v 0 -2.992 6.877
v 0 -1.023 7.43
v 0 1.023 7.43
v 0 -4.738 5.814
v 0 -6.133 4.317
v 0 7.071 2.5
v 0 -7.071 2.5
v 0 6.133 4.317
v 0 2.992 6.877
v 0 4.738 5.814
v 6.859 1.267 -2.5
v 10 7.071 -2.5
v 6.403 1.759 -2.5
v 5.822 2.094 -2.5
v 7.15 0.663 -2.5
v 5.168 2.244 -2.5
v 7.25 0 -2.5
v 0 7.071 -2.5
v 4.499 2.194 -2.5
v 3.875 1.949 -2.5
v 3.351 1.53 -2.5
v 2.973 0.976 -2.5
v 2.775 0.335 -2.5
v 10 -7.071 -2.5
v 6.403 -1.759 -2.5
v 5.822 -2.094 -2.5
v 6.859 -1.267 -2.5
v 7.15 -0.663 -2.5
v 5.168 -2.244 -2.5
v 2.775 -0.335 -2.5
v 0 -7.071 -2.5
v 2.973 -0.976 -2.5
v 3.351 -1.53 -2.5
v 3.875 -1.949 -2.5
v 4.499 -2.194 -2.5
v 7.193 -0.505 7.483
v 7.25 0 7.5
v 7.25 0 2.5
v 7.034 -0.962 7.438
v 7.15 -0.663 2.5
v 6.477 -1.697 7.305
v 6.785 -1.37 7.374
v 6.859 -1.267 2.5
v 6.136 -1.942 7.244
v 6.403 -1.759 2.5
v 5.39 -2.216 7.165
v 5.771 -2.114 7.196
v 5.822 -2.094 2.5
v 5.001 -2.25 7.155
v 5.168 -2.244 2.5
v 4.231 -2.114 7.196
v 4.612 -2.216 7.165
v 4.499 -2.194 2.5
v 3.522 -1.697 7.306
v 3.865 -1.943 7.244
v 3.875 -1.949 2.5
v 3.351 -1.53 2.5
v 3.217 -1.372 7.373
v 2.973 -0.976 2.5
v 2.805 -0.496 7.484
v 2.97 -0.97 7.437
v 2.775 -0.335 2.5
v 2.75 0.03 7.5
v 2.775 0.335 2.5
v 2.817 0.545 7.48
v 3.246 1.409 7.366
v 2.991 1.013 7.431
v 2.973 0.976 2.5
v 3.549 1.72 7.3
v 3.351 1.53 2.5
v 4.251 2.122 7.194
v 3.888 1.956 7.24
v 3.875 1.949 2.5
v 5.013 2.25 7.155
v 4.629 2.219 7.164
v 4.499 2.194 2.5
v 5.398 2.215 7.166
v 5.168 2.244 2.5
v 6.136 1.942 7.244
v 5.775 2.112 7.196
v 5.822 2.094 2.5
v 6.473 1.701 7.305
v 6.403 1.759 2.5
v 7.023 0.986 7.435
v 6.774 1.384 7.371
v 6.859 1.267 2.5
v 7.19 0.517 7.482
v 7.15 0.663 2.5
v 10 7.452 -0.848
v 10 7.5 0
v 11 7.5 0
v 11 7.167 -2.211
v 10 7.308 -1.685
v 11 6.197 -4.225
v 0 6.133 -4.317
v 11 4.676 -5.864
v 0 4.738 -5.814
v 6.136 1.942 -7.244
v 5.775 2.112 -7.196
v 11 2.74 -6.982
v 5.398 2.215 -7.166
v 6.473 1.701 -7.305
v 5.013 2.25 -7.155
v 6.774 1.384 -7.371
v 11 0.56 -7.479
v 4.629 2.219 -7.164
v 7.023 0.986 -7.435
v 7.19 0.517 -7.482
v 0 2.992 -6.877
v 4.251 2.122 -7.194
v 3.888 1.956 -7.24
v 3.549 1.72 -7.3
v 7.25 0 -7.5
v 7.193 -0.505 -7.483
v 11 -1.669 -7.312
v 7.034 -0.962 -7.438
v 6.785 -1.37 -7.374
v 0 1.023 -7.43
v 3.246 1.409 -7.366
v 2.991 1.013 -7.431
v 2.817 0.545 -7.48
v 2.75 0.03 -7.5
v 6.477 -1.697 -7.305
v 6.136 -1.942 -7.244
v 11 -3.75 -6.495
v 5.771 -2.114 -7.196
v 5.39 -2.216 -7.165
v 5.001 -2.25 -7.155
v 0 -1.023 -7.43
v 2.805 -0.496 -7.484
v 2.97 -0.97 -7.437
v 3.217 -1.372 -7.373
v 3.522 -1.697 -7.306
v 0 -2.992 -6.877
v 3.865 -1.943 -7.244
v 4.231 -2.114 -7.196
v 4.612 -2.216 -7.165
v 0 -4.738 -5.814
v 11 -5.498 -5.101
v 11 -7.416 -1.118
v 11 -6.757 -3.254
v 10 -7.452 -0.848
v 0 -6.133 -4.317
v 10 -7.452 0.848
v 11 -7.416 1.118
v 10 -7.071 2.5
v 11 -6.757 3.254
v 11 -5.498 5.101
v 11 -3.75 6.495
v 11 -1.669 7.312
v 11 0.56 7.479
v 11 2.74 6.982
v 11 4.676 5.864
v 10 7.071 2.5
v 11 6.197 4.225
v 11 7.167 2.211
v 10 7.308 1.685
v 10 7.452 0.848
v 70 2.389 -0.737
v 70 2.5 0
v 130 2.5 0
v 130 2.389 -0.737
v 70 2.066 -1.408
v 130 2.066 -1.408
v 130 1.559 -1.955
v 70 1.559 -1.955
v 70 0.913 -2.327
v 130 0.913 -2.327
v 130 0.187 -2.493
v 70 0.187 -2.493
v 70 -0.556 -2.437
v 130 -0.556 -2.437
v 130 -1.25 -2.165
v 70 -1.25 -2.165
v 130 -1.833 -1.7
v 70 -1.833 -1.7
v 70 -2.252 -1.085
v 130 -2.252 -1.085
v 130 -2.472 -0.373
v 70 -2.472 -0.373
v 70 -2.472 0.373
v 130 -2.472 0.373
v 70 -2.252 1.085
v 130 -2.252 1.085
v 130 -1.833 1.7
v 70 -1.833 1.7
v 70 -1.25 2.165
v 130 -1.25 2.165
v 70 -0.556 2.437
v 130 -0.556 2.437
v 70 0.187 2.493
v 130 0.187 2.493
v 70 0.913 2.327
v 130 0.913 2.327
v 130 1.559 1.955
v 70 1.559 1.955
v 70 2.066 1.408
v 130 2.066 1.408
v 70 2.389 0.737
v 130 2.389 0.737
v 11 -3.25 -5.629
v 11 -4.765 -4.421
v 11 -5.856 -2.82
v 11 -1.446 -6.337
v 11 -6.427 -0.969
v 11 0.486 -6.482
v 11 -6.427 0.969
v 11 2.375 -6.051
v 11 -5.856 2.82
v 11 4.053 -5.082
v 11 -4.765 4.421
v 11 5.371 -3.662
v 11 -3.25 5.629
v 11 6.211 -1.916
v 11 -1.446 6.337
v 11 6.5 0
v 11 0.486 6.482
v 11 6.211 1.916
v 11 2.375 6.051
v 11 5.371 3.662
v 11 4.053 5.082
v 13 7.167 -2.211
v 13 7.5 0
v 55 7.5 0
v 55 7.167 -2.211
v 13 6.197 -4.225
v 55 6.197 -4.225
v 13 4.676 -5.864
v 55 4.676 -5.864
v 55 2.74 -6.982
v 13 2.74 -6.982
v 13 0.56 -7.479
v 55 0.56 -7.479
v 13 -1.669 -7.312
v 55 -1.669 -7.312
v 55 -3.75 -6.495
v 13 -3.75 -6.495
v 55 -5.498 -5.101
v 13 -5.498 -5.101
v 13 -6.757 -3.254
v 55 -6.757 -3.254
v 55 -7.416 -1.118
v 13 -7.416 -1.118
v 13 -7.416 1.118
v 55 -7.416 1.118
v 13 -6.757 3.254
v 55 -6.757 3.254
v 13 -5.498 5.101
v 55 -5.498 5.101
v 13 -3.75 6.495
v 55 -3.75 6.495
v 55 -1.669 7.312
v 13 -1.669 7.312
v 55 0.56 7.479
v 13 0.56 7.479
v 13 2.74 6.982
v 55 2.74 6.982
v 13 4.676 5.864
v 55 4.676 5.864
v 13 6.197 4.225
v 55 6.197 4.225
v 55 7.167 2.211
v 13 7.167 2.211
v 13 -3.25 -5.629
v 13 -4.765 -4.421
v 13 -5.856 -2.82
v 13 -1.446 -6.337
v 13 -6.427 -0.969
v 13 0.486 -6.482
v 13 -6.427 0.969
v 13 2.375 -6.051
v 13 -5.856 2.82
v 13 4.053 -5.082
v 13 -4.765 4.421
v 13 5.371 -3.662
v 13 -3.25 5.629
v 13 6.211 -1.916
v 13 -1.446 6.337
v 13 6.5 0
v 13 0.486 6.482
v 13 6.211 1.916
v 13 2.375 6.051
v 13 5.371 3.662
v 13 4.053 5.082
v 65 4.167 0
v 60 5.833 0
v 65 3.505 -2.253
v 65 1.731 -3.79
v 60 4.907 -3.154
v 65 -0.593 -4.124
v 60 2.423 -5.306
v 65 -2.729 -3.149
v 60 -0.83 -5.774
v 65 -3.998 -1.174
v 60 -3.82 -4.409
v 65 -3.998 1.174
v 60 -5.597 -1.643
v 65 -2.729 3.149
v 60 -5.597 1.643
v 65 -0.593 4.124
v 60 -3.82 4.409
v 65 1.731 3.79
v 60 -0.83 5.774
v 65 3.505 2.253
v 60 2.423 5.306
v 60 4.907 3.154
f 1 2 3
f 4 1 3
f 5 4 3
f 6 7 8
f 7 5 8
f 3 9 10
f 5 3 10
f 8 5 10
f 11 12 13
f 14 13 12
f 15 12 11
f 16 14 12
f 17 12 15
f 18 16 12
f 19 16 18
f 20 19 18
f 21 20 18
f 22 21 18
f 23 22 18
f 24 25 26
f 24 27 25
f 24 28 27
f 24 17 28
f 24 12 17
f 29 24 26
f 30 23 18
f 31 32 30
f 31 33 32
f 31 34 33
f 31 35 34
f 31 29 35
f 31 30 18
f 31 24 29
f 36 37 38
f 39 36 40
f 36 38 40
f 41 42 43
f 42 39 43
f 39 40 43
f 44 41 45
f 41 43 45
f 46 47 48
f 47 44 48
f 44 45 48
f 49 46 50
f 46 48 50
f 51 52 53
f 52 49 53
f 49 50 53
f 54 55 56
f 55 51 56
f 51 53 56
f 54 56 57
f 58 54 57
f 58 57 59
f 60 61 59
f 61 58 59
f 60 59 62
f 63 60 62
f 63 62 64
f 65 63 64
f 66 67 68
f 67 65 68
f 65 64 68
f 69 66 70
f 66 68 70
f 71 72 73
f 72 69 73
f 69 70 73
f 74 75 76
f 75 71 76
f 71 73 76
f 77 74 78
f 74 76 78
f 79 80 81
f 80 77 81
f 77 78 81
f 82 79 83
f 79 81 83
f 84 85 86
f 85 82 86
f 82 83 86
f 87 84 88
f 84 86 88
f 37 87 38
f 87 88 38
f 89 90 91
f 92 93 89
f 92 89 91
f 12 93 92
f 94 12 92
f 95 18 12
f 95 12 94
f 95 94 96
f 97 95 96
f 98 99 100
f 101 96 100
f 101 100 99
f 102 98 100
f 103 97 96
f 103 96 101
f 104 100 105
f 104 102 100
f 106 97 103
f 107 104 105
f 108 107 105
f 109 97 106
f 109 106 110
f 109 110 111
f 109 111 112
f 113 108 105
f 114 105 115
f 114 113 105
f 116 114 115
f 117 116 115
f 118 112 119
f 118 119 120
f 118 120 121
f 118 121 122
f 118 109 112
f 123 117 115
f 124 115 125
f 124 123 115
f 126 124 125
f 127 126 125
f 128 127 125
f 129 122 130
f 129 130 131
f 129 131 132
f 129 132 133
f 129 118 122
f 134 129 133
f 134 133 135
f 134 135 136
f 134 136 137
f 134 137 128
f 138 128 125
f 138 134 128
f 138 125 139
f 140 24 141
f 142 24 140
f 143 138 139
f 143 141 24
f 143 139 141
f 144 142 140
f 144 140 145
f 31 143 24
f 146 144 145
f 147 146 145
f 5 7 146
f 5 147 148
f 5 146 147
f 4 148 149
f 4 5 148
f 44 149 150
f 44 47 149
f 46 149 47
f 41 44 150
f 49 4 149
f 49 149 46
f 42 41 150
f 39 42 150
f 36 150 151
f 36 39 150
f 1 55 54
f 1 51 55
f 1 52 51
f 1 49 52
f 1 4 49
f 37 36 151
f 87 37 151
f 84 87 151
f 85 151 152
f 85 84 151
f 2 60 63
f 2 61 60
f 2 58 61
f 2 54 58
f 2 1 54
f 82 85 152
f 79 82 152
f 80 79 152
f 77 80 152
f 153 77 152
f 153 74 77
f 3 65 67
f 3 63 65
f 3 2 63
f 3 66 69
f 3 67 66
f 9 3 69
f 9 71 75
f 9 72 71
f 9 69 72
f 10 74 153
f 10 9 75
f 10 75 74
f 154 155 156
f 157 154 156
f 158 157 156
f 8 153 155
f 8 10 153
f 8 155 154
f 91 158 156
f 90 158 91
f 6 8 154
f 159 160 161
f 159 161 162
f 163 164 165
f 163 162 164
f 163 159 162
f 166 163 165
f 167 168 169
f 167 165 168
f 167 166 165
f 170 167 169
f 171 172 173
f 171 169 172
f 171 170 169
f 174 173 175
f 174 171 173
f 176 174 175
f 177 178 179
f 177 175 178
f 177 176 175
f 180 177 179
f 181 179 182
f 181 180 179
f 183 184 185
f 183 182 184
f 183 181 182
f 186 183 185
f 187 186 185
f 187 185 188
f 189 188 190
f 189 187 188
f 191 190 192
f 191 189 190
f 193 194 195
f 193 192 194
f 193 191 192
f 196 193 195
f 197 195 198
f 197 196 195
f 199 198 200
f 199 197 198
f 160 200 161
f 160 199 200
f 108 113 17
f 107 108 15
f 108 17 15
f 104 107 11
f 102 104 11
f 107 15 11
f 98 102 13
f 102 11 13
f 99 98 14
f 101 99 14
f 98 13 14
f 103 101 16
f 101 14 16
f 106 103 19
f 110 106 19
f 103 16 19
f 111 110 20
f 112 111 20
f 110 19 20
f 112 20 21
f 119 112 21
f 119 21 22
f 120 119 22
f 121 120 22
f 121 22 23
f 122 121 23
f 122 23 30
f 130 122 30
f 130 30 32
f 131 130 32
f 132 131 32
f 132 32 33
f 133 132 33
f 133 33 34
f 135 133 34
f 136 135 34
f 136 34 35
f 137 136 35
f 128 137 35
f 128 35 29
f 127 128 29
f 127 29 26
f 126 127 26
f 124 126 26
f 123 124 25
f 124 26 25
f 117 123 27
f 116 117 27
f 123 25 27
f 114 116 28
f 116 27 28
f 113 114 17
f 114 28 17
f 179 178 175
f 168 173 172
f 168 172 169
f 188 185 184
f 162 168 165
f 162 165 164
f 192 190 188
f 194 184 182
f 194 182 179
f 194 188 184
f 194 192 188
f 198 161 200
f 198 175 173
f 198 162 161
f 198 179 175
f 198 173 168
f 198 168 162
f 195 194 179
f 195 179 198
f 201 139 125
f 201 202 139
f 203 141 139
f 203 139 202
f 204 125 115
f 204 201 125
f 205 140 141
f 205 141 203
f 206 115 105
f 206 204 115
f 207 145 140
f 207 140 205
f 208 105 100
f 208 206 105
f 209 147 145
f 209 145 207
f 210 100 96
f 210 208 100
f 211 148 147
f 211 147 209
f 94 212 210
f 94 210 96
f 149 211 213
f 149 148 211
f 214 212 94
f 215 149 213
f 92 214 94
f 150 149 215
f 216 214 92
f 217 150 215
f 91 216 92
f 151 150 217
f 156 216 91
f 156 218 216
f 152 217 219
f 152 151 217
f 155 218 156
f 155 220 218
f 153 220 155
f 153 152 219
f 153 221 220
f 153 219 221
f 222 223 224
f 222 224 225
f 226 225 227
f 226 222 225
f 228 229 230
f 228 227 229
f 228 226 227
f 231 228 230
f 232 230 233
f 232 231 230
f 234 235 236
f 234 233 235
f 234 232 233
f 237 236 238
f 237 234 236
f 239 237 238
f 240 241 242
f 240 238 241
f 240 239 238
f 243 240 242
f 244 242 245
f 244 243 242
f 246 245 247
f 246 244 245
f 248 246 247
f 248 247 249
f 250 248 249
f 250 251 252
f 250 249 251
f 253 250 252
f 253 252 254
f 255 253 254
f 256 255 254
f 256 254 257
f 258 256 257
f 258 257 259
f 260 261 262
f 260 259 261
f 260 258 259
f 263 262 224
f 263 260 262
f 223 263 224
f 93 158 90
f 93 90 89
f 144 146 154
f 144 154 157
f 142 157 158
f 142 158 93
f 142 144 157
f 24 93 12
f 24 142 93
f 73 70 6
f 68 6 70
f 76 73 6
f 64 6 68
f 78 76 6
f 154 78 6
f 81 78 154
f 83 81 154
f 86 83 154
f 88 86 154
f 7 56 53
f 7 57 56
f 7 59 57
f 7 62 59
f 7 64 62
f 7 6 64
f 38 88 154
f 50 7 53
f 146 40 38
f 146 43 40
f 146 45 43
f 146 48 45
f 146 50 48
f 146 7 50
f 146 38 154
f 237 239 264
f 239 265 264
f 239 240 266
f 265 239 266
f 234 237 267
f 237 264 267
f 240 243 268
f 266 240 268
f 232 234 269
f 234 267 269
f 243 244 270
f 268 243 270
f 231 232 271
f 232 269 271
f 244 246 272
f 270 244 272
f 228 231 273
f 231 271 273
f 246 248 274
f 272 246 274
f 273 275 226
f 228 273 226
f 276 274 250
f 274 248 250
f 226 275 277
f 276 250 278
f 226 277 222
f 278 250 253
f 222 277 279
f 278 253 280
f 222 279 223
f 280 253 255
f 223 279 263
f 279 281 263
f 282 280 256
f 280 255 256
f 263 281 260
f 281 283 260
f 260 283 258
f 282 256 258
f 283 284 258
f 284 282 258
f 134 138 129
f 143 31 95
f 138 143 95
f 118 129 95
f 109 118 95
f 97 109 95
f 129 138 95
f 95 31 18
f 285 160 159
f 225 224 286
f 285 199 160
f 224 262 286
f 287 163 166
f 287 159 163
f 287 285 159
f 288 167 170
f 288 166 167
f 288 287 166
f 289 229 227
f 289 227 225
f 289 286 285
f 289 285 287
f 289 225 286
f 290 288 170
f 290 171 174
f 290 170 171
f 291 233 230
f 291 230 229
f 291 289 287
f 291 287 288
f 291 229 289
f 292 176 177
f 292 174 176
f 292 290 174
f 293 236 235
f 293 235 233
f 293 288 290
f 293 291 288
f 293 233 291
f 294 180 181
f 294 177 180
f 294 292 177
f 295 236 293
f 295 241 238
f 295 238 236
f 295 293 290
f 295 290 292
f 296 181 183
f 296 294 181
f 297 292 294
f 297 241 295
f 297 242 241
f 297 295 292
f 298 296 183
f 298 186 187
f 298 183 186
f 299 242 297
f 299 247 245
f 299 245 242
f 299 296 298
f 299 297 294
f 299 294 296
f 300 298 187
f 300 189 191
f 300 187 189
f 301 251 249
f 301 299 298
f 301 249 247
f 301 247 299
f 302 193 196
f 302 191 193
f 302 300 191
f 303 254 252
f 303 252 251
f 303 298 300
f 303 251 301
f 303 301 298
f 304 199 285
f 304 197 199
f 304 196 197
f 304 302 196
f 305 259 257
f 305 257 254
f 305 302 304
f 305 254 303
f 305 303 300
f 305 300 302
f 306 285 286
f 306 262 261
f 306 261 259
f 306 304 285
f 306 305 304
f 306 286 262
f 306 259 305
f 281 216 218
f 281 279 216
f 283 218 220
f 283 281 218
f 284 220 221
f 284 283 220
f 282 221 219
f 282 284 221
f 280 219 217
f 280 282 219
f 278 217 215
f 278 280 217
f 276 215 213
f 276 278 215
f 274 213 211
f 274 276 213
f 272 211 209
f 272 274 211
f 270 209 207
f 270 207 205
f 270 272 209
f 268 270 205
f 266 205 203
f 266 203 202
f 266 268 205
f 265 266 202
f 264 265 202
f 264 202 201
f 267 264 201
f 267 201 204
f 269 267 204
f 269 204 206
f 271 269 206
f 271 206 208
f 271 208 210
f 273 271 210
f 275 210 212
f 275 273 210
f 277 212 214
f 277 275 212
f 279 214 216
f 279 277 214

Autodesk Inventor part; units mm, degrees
ref_plane "YZ Plane" through (0, 0, 0) normal (1, 0, 0) x (0, 1, 0)
ref_plane "XZ Plane" through (0, 0, 0) normal (0, 1, 0) x (-1, 0, 0)
ref_plane "XY Plane" through (0, 0, 0) normal (0, 0, 1) x (1, 0, 0)
sketch "Skizze1" plane through (0, 0, 0) normal (0, 0, 1) x (1, 0, 0)
  line L0 (0, 0) -> (130, 0)
  line L1 (130, 0) -> (130, 2.5)
  line L2 (130, 2.5) -> (70, 2.5)
  line L3 (70, 2.5) -> (55, 7.5)
  line L4 (0, 7.5) -> (0, 0)
  line L5 (-57.0949, 0) -> (91.8524, 0)
  line L6 (-94.5139, 0) -> (167.419, 0) projected
  line L7 (0, -1.5) -> (0, 9) projected
  line L8 (11, 7.5) -> (11, 6.5)
  line L9 (11, 6.5) -> (13, 6.5)
  line L10 (13, 6.5) -> (13, 7.5)
  line L11 (55, 7.5) -> (13, 7.5)
  line L12 (11, 7.5) -> (0, 7.5)
  point P0 (0, 0)
  point P1 (0, -1.5)
  point P2 (0, 9)
  dimension "d0" = 130
  dimension "d1" = 5
  dimension "d3" = 55
  dimension "d4" = 15
  dimension "d5" = 11
  dimension "d6" = 2
  dimension "d7" = 1
  dimension "d8" = 15
revolve "Umdrehung1" add sketch "Skizze1" angle 360 about axis through (-57.0949, 0, 0) along (1, 0, 0)
sketch "Skizze2" plane through (0, 0, 0) normal (0, 1, 0) x (-1, 0, 0)
  line L0 (0, 2.5) -> (-10, 2.5)
  line L1 (-10, 2.5) -> (-10, -2.5)
  line L2 (-10, -2.5) -> (0, -2.5)
  line L3 (0, -2.5) -> (0, 2.5)
  point P0 (0, 0)
  point P1 (0, 0)
  dimension "d10" = 10
  dimension "d11" = 5
extrude "Extrusion1" cut sketch "Skizze2" along normal through all both and the other way through all
sketch "Skizze3" plane through (0, 0, 0) normal (0, 0, 1) x (1, 0, 0)
  circle A0 centre (5, 0) radius 2.25
  line L0 (0, -7.0711) -> (0, 7.0711) projected
  point P0 (0, 0)
  point P1 (0, 0)
  dimension "d14" = 5
  dimension "d15" = 4.5
extrude "Extrusion2" cut sketch "Skizze3" along normal through all both and the other way through all
thread "Gewinde1" size "M5x0.8" class "6g" standard "ANSI Metric M Profile" length 50
properties part number "Anker"
